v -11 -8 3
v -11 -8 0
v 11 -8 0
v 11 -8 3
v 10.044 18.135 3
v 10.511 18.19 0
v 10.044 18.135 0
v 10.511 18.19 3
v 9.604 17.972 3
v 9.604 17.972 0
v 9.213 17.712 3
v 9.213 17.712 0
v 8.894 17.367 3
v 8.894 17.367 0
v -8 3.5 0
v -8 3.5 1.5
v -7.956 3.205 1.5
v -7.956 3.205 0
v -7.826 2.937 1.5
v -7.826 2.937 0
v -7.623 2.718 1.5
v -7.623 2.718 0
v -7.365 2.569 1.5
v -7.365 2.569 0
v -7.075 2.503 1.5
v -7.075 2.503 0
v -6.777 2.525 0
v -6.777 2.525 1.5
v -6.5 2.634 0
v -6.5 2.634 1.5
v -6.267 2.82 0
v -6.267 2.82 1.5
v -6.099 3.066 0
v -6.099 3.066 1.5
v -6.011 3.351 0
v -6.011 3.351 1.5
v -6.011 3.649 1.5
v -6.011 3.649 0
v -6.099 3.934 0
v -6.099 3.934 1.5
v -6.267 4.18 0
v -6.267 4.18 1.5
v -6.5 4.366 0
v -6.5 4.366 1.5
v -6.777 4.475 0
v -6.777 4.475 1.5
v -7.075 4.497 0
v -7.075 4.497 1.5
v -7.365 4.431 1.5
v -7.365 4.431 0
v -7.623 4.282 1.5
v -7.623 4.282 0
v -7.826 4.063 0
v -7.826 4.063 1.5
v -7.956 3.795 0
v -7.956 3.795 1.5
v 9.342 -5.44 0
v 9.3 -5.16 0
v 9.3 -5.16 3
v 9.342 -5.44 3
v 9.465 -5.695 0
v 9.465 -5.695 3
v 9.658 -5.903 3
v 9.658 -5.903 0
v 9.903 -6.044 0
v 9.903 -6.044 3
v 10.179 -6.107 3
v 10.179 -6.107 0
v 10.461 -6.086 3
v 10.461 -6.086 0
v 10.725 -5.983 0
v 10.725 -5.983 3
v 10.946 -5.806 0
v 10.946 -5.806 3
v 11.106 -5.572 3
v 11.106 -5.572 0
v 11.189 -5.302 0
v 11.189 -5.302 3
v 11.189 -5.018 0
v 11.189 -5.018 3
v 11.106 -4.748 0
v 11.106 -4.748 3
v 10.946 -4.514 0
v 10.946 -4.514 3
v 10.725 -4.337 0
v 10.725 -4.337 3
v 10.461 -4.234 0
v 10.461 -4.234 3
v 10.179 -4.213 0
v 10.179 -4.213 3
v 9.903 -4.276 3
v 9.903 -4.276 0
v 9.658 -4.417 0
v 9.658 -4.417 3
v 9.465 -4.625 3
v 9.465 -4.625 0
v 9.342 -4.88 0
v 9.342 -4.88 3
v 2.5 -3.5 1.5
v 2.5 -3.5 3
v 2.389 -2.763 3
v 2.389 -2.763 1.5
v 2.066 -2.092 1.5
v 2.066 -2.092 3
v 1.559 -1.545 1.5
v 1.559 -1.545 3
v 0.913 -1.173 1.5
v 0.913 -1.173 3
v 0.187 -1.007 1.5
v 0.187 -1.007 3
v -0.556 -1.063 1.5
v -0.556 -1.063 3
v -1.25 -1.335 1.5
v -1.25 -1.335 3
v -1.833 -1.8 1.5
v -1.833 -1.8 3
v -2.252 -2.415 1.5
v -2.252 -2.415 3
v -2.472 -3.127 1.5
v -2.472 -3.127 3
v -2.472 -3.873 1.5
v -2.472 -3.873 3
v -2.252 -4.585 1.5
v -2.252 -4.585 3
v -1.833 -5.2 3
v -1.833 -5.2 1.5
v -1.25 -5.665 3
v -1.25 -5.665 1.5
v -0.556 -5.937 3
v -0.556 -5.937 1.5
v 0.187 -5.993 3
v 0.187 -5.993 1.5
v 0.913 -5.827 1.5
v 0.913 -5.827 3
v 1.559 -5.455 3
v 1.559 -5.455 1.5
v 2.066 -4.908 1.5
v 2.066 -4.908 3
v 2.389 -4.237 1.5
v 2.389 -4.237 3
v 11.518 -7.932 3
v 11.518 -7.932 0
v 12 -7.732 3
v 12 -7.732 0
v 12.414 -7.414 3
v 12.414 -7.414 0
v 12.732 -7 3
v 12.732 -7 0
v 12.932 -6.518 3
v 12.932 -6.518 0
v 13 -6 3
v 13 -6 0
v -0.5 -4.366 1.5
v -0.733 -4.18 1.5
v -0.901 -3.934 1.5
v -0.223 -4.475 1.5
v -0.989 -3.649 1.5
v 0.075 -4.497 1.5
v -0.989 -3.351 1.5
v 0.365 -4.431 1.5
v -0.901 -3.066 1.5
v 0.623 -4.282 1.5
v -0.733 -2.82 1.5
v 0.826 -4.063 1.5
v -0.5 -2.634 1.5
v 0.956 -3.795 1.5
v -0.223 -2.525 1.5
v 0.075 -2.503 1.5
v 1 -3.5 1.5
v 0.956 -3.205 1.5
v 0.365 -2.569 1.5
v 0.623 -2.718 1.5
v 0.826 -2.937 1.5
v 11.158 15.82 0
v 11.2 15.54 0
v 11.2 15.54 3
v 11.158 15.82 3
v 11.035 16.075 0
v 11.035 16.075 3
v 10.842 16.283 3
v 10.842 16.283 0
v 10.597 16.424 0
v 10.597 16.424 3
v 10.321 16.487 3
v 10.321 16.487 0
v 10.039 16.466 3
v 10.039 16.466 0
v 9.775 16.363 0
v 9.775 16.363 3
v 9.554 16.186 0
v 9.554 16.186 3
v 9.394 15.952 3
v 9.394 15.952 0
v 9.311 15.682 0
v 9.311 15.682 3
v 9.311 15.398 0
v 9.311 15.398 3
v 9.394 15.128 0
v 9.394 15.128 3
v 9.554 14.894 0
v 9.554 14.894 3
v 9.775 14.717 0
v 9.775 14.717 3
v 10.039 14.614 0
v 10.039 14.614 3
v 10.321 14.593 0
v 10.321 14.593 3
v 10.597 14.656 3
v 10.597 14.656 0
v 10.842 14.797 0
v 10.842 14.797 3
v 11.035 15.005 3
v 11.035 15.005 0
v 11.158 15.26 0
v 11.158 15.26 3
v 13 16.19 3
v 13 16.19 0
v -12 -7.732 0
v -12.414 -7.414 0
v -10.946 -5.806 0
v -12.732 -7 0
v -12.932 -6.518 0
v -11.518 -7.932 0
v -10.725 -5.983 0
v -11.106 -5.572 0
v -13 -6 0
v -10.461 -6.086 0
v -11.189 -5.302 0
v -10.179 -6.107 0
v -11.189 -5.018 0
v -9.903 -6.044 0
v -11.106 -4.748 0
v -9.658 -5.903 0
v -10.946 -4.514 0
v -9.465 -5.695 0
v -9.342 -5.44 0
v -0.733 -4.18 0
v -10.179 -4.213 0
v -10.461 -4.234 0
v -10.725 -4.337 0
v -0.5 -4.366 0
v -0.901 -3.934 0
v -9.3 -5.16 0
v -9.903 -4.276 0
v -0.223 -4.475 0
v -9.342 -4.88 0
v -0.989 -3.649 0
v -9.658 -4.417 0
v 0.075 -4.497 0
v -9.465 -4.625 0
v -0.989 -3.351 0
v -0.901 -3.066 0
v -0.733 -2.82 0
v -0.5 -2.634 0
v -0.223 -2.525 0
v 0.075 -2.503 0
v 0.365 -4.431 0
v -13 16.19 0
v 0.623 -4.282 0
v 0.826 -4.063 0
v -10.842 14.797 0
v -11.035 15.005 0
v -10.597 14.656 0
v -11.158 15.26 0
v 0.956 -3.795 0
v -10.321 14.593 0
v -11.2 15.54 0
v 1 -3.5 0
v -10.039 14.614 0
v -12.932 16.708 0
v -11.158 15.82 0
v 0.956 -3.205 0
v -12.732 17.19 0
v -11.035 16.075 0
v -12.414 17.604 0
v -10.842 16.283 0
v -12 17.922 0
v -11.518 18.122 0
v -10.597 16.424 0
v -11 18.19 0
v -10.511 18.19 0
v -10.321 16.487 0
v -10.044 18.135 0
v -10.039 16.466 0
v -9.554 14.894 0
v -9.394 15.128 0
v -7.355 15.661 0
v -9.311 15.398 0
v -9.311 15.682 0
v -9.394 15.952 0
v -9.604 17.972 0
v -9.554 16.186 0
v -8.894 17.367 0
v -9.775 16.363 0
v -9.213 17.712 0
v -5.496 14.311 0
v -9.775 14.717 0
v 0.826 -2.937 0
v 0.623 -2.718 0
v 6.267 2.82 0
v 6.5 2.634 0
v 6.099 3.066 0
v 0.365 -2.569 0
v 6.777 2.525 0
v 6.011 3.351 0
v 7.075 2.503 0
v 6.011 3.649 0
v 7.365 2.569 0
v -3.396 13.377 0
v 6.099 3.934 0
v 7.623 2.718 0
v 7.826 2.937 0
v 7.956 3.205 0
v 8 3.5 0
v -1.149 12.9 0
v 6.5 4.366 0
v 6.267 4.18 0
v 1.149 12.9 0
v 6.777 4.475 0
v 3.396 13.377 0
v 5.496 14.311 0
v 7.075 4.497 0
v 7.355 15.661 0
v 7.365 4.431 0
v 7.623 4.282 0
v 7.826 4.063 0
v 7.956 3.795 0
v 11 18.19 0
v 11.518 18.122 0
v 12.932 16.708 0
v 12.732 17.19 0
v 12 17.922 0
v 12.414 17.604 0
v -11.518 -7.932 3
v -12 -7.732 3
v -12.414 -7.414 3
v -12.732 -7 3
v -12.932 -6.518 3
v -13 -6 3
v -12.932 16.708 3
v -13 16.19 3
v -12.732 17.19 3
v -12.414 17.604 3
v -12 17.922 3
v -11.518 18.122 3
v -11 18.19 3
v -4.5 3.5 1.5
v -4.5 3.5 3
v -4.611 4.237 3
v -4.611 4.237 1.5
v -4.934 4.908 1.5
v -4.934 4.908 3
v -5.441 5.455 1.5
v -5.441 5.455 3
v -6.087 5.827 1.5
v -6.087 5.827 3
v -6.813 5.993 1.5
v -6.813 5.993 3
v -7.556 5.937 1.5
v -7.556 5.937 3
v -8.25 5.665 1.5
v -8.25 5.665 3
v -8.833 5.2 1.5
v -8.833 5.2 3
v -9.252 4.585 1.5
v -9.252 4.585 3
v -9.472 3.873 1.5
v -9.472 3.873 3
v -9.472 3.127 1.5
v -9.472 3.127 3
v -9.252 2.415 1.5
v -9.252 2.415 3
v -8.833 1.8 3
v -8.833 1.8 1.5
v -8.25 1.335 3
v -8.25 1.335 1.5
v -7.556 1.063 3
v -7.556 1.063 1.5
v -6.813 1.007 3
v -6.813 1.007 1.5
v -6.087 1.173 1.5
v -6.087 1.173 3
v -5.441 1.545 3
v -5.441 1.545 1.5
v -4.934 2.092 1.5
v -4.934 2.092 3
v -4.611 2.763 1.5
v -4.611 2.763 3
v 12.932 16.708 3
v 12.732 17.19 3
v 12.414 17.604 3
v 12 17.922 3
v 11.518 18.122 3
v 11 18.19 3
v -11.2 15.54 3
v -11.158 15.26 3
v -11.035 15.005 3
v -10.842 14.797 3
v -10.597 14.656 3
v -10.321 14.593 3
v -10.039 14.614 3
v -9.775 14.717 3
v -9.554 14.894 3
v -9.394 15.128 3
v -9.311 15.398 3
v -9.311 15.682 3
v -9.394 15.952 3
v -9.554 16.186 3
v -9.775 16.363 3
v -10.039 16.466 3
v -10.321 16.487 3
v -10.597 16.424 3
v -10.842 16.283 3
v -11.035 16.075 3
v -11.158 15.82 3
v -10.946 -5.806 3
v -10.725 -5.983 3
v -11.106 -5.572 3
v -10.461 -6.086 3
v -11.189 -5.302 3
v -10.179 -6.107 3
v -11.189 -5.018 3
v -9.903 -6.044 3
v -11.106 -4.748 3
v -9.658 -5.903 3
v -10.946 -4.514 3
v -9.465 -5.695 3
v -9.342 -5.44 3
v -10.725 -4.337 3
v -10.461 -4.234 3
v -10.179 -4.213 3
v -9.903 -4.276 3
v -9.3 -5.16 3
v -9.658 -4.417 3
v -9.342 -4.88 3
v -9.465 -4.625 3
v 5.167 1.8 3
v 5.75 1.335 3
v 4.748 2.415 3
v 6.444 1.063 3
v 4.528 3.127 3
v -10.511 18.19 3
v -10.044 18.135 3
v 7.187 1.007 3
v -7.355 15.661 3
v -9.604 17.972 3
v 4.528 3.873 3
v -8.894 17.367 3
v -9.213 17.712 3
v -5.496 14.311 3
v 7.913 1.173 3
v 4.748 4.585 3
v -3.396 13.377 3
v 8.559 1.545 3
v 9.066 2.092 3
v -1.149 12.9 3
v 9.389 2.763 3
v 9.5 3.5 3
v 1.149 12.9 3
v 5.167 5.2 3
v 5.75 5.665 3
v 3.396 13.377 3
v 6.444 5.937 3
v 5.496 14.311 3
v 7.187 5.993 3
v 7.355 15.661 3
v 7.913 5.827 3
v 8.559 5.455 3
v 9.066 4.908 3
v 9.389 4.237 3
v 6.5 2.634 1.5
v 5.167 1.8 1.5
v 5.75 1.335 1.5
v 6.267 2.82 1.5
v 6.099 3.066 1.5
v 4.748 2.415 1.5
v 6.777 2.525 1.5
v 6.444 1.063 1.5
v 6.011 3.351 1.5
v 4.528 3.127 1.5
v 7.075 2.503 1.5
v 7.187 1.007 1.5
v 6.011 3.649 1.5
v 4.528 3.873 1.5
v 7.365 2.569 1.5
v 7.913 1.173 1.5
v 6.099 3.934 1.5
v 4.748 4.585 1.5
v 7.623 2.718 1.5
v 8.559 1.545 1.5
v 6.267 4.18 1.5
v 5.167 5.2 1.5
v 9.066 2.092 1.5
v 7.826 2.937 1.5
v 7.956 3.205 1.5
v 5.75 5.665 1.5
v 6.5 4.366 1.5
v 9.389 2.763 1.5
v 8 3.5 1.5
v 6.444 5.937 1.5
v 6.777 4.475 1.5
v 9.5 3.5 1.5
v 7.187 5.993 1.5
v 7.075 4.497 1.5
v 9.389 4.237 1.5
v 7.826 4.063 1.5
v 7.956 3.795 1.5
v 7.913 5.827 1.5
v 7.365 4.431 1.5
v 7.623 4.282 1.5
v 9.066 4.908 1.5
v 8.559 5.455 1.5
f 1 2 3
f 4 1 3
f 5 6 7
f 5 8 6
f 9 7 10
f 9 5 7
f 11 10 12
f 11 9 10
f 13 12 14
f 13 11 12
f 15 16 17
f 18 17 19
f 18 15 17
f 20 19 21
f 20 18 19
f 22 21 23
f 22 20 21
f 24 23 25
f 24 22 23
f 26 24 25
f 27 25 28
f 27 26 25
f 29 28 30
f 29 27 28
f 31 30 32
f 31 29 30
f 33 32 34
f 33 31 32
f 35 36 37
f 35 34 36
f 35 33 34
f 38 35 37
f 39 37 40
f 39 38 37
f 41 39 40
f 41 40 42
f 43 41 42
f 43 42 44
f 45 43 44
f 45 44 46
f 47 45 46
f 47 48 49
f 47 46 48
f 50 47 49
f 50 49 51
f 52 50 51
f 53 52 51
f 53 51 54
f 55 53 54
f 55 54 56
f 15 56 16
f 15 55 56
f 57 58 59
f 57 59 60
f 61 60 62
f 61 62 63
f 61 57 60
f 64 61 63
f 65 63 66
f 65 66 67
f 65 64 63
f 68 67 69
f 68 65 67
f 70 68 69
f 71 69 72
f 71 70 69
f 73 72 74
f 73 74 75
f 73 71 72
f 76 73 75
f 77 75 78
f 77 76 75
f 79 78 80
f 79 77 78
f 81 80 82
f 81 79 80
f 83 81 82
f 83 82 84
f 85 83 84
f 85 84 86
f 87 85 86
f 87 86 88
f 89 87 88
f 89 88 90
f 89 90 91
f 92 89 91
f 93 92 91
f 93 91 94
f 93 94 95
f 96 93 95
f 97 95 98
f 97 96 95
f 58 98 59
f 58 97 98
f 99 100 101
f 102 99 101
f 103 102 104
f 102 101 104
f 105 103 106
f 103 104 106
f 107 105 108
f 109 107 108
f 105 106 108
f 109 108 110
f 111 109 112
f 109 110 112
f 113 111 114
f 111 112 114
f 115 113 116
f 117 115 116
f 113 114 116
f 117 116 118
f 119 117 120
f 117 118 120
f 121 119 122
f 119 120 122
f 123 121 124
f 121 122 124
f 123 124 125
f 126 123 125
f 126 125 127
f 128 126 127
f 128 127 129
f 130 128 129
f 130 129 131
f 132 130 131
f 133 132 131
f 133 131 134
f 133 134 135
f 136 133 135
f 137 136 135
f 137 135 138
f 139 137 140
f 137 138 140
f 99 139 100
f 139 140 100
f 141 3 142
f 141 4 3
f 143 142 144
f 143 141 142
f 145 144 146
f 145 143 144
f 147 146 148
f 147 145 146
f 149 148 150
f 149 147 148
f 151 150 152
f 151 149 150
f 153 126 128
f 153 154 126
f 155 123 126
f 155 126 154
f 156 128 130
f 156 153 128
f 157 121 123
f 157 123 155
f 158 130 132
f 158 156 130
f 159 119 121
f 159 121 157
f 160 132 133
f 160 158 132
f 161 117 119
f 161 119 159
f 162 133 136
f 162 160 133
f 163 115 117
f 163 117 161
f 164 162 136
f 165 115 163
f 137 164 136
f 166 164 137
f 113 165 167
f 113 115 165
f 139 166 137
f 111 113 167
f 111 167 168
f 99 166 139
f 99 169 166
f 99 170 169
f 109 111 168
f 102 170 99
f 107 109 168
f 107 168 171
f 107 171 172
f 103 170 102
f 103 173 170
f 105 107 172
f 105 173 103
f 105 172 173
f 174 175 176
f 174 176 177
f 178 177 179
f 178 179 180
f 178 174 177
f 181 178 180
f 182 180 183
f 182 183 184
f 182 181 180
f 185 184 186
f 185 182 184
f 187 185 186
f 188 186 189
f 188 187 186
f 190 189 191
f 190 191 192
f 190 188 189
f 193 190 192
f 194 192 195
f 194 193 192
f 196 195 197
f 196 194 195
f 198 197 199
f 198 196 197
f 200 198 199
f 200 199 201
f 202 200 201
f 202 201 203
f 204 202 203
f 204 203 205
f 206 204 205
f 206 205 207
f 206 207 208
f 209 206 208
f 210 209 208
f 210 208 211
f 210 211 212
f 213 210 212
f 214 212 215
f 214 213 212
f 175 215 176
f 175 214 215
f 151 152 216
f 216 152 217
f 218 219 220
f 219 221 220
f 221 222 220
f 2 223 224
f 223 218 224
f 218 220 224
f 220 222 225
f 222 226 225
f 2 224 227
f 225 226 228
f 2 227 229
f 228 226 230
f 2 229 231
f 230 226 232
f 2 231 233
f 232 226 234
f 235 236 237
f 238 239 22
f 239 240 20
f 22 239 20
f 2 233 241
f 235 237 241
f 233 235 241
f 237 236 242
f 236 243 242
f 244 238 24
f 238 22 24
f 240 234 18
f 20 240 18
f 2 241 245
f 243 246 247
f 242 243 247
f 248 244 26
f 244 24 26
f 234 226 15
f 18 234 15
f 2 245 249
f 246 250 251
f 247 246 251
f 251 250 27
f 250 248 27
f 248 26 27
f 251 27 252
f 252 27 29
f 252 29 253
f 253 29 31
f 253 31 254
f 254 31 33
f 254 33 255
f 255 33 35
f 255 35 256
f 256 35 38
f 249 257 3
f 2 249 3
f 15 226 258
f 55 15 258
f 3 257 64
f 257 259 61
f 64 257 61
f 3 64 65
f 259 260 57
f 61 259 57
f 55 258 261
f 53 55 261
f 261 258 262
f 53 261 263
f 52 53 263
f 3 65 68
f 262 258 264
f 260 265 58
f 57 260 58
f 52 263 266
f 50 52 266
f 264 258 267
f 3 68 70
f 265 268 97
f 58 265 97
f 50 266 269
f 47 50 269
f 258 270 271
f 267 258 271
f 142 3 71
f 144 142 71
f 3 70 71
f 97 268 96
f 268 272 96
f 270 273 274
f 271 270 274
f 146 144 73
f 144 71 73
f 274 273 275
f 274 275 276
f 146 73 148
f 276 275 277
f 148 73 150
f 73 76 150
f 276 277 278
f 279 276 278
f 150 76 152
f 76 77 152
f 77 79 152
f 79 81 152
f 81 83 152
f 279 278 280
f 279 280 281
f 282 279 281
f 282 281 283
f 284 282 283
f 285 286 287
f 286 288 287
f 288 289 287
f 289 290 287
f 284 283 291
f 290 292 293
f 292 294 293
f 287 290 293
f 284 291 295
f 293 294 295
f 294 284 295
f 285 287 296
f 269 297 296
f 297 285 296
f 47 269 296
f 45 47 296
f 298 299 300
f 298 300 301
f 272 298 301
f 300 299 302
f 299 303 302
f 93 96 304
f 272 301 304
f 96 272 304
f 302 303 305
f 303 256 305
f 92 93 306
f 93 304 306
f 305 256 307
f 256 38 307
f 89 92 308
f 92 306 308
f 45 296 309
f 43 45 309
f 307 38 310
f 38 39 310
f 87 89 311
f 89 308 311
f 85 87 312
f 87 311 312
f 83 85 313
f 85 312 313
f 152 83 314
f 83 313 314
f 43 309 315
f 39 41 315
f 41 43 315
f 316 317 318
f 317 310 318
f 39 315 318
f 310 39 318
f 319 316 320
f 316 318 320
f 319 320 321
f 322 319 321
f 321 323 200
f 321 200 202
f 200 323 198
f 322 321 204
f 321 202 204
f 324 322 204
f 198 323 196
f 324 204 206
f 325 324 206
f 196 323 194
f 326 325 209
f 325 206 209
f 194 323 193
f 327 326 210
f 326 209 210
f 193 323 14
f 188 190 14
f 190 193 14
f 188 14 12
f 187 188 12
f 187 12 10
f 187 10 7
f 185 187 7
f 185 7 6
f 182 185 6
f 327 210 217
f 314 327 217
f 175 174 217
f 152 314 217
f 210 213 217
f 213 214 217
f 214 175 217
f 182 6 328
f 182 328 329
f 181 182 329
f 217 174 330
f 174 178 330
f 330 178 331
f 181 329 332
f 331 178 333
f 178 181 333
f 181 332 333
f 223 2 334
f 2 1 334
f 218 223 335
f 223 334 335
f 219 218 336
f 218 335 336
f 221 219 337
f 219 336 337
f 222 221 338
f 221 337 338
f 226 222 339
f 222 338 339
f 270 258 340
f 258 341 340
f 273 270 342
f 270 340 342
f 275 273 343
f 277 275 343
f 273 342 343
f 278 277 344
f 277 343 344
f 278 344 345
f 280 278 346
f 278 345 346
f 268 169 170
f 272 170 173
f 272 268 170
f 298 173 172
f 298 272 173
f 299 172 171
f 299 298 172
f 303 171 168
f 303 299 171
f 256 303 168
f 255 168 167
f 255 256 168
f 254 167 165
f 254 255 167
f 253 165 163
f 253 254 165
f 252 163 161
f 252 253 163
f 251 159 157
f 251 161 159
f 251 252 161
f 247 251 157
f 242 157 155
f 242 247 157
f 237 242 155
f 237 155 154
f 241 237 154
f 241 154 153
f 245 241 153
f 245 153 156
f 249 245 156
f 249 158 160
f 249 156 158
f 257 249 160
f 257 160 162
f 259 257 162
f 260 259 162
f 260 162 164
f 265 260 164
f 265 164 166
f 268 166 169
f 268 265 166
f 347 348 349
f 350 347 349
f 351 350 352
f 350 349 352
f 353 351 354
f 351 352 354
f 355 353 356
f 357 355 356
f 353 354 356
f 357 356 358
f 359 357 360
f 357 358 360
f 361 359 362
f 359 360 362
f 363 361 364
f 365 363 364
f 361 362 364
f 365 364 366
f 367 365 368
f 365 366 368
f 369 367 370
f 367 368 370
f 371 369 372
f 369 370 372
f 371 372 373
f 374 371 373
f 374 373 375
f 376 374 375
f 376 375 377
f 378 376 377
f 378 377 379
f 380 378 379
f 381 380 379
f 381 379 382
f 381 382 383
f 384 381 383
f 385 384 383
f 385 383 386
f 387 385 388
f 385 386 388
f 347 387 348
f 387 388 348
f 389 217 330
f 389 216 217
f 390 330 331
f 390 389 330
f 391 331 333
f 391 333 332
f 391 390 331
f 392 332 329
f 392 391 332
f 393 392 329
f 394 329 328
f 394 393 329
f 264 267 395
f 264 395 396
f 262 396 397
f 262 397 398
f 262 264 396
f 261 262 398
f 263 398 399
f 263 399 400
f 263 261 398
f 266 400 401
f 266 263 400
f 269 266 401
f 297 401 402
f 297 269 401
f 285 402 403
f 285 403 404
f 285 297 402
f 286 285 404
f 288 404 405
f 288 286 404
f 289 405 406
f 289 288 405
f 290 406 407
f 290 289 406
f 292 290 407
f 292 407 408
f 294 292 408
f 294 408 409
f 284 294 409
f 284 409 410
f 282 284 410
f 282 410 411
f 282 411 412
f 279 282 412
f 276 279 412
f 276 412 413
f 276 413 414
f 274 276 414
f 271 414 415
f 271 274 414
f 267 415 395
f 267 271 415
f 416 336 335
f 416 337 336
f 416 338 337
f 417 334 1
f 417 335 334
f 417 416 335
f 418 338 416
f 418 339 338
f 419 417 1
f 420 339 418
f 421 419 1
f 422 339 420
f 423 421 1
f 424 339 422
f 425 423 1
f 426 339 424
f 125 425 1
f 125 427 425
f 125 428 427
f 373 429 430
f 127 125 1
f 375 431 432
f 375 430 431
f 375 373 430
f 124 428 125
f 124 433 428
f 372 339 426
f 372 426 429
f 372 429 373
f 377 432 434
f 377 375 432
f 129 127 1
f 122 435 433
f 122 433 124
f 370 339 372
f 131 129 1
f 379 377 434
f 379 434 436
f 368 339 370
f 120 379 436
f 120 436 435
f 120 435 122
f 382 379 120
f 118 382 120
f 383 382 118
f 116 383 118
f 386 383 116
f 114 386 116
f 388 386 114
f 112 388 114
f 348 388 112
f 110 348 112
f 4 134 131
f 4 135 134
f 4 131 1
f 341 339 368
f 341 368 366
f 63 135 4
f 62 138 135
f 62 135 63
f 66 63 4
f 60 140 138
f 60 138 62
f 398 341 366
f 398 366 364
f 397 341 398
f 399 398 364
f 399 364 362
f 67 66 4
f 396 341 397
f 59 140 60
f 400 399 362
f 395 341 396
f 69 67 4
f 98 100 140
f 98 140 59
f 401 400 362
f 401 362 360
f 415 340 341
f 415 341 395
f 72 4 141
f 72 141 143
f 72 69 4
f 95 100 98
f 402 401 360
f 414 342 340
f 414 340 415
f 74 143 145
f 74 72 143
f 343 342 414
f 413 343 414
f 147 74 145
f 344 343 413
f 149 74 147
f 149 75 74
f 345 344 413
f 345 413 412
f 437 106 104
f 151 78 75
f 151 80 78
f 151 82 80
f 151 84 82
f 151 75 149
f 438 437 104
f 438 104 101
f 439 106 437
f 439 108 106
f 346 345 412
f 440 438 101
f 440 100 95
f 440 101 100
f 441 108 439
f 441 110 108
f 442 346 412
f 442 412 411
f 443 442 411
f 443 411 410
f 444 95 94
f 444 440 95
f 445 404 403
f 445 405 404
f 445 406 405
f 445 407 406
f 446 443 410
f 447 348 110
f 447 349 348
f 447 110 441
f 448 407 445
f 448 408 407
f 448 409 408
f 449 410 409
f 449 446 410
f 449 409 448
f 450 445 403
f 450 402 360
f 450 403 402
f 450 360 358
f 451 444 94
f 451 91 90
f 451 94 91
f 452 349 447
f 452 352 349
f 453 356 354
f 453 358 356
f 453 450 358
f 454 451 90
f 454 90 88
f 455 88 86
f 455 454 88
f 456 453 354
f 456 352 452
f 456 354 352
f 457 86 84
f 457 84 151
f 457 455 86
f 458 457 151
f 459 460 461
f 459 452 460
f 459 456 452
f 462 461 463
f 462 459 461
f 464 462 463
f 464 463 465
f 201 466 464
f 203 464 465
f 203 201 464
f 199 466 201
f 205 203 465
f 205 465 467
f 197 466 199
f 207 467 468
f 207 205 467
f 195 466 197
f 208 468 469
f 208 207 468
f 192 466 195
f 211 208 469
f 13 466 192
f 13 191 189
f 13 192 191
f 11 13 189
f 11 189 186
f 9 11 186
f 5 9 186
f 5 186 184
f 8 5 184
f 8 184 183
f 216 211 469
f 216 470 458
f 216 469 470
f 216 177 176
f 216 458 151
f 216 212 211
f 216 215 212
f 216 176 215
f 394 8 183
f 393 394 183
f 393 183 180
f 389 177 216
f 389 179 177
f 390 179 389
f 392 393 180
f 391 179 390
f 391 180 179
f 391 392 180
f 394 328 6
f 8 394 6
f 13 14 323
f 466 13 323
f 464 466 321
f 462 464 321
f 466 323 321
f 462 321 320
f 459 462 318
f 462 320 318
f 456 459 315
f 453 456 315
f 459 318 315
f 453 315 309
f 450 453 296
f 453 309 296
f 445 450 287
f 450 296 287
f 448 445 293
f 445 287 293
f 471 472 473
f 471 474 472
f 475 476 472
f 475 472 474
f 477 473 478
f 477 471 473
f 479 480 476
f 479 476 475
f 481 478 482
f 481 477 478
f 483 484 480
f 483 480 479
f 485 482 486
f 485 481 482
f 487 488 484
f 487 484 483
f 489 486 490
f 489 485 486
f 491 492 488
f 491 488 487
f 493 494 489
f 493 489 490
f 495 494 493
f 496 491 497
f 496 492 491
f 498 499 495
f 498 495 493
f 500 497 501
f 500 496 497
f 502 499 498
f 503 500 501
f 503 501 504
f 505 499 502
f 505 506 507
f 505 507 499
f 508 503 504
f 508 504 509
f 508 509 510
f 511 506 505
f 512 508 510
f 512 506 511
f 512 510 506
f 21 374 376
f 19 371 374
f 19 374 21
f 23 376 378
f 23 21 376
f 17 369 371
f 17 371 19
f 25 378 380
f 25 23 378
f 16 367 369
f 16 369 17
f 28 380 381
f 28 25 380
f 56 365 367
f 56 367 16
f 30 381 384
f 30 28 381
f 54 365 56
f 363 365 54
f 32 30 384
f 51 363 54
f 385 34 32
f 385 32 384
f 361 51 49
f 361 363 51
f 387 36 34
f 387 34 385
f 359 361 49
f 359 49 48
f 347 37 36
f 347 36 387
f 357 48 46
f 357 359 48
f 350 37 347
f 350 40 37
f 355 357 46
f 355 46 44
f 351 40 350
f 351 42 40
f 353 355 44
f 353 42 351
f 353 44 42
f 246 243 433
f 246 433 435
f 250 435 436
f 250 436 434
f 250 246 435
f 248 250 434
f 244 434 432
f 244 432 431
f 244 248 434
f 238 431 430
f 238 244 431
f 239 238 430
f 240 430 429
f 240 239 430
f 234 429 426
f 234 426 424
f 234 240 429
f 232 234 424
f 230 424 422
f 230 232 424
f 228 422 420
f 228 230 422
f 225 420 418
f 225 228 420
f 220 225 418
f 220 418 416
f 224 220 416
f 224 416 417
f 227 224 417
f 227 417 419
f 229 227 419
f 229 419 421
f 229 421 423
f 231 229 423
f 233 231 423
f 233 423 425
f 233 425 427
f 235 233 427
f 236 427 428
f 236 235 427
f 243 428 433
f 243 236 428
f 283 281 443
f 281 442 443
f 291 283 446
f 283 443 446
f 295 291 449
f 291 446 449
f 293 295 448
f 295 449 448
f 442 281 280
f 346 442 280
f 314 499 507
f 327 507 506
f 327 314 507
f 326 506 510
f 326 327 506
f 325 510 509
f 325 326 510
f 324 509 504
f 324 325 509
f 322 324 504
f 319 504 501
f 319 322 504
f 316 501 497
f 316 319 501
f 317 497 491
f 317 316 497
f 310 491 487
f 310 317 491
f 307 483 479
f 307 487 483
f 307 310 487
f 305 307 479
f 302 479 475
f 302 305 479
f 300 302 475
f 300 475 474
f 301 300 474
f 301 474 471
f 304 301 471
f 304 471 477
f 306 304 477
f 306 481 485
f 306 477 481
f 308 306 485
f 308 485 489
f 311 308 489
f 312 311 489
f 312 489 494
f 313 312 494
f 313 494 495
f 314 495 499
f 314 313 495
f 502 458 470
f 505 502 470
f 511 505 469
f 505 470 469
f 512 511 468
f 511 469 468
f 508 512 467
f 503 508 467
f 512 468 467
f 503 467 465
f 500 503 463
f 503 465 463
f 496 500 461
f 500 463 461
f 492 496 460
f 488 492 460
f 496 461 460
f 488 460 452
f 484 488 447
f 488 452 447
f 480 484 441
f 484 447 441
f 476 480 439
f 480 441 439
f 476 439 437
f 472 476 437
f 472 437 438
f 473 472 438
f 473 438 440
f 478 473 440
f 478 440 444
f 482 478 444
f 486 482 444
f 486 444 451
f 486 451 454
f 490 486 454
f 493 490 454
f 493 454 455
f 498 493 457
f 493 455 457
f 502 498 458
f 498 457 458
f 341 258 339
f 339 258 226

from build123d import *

# Parameters (mm, degrees)
SKETCH_1_R          = 1
SKETCH_1_R_2        = 0.95
EXTRUDE_1_DEPTH     = 3
SKETCH_2_R          = 2.5
CUT_EXTRUDE_1_DEPTH = 1.5
FILLET_1_R          = 2


with BuildPart() as part:
    # 草图1 → 凸台-拉伸1 (new body)
    with BuildSketch(Plane.XY):
        with BuildLine():
            Line((-13, -8), (13, -8))
            Line((13, -8), (13, 18.190012112))
            Line((13, 18.190012112), (9.43808773, 18.190012112))
            ThreePointArc((9.43808773, 18.190012112), (0, 12.840012112), (-9.43808773, 18.190012112))
            Line((-9.43808773, 18.190012112), (-13, 18.190012112))
            Line((-13, 18.190012112), (-13, -8))
        make_face()
        with Locations((7, 3.5)):
            Circle(SKETCH_1_R, mode=Mode.SUBTRACT)
        with Locations(Location((-7, 3.5, 0), (0, 0, 180))):
            Circle(SKETCH_1_R, mode=Mode.SUBTRACT)
        with Locations((0, -3.5)):
            Circle(SKETCH_1_R, mode=Mode.SUBTRACT)
        with Locations((10.25, 15.540012112)):
            Circle(SKETCH_1_R_2, mode=Mode.SUBTRACT)
        with Locations(Location((-10.25, 15.540012112, 0), (0, 0, 180))):
            Circle(SKETCH_1_R_2, mode=Mode.SUBTRACT)
        with Locations((-10.25, -5.159987888)):
            Circle(SKETCH_1_R_2, mode=Mode.SUBTRACT)
        with Locations(Location((10.25, -5.159987888, 0), (0, 0, 180))):
            Circle(SKETCH_1_R_2, mode=Mode.SUBTRACT)
    extrude(amount=EXTRUDE_1_DEPTH)

    # 草图2 → 切除-拉伸1 (cut)
    with BuildSketch(Plane.XY.offset(3)):
        with Locations((-7, 3.5)):
            Circle(SKETCH_2_R)
        with Locations((7, 3.5)):
            Circle(SKETCH_2_R)
        with Locations((0, -3.5)):
            Circle(SKETCH_2_R)
    extrude(amount=-CUT_EXTRUDE_1_DEPTH, mode=Mode.SUBTRACT)

    # 圆角1
    fillet_1_edges = [part.edges().sort_by_distance(p)[0] for p in [
        (13, -8, 1.5),
        (-13, -8, 1.5),
        (-13, 18.190012112, 1.5),
        (-9.43808773, 18.190012112, 1.5),
        (9.43808773, 18.190012112, 1.5),
        (13, 18.190012112, 1.5),
    ]]
    fillet(fillet_1_edges, radius=FILLET_1_R)


solid = part.part
